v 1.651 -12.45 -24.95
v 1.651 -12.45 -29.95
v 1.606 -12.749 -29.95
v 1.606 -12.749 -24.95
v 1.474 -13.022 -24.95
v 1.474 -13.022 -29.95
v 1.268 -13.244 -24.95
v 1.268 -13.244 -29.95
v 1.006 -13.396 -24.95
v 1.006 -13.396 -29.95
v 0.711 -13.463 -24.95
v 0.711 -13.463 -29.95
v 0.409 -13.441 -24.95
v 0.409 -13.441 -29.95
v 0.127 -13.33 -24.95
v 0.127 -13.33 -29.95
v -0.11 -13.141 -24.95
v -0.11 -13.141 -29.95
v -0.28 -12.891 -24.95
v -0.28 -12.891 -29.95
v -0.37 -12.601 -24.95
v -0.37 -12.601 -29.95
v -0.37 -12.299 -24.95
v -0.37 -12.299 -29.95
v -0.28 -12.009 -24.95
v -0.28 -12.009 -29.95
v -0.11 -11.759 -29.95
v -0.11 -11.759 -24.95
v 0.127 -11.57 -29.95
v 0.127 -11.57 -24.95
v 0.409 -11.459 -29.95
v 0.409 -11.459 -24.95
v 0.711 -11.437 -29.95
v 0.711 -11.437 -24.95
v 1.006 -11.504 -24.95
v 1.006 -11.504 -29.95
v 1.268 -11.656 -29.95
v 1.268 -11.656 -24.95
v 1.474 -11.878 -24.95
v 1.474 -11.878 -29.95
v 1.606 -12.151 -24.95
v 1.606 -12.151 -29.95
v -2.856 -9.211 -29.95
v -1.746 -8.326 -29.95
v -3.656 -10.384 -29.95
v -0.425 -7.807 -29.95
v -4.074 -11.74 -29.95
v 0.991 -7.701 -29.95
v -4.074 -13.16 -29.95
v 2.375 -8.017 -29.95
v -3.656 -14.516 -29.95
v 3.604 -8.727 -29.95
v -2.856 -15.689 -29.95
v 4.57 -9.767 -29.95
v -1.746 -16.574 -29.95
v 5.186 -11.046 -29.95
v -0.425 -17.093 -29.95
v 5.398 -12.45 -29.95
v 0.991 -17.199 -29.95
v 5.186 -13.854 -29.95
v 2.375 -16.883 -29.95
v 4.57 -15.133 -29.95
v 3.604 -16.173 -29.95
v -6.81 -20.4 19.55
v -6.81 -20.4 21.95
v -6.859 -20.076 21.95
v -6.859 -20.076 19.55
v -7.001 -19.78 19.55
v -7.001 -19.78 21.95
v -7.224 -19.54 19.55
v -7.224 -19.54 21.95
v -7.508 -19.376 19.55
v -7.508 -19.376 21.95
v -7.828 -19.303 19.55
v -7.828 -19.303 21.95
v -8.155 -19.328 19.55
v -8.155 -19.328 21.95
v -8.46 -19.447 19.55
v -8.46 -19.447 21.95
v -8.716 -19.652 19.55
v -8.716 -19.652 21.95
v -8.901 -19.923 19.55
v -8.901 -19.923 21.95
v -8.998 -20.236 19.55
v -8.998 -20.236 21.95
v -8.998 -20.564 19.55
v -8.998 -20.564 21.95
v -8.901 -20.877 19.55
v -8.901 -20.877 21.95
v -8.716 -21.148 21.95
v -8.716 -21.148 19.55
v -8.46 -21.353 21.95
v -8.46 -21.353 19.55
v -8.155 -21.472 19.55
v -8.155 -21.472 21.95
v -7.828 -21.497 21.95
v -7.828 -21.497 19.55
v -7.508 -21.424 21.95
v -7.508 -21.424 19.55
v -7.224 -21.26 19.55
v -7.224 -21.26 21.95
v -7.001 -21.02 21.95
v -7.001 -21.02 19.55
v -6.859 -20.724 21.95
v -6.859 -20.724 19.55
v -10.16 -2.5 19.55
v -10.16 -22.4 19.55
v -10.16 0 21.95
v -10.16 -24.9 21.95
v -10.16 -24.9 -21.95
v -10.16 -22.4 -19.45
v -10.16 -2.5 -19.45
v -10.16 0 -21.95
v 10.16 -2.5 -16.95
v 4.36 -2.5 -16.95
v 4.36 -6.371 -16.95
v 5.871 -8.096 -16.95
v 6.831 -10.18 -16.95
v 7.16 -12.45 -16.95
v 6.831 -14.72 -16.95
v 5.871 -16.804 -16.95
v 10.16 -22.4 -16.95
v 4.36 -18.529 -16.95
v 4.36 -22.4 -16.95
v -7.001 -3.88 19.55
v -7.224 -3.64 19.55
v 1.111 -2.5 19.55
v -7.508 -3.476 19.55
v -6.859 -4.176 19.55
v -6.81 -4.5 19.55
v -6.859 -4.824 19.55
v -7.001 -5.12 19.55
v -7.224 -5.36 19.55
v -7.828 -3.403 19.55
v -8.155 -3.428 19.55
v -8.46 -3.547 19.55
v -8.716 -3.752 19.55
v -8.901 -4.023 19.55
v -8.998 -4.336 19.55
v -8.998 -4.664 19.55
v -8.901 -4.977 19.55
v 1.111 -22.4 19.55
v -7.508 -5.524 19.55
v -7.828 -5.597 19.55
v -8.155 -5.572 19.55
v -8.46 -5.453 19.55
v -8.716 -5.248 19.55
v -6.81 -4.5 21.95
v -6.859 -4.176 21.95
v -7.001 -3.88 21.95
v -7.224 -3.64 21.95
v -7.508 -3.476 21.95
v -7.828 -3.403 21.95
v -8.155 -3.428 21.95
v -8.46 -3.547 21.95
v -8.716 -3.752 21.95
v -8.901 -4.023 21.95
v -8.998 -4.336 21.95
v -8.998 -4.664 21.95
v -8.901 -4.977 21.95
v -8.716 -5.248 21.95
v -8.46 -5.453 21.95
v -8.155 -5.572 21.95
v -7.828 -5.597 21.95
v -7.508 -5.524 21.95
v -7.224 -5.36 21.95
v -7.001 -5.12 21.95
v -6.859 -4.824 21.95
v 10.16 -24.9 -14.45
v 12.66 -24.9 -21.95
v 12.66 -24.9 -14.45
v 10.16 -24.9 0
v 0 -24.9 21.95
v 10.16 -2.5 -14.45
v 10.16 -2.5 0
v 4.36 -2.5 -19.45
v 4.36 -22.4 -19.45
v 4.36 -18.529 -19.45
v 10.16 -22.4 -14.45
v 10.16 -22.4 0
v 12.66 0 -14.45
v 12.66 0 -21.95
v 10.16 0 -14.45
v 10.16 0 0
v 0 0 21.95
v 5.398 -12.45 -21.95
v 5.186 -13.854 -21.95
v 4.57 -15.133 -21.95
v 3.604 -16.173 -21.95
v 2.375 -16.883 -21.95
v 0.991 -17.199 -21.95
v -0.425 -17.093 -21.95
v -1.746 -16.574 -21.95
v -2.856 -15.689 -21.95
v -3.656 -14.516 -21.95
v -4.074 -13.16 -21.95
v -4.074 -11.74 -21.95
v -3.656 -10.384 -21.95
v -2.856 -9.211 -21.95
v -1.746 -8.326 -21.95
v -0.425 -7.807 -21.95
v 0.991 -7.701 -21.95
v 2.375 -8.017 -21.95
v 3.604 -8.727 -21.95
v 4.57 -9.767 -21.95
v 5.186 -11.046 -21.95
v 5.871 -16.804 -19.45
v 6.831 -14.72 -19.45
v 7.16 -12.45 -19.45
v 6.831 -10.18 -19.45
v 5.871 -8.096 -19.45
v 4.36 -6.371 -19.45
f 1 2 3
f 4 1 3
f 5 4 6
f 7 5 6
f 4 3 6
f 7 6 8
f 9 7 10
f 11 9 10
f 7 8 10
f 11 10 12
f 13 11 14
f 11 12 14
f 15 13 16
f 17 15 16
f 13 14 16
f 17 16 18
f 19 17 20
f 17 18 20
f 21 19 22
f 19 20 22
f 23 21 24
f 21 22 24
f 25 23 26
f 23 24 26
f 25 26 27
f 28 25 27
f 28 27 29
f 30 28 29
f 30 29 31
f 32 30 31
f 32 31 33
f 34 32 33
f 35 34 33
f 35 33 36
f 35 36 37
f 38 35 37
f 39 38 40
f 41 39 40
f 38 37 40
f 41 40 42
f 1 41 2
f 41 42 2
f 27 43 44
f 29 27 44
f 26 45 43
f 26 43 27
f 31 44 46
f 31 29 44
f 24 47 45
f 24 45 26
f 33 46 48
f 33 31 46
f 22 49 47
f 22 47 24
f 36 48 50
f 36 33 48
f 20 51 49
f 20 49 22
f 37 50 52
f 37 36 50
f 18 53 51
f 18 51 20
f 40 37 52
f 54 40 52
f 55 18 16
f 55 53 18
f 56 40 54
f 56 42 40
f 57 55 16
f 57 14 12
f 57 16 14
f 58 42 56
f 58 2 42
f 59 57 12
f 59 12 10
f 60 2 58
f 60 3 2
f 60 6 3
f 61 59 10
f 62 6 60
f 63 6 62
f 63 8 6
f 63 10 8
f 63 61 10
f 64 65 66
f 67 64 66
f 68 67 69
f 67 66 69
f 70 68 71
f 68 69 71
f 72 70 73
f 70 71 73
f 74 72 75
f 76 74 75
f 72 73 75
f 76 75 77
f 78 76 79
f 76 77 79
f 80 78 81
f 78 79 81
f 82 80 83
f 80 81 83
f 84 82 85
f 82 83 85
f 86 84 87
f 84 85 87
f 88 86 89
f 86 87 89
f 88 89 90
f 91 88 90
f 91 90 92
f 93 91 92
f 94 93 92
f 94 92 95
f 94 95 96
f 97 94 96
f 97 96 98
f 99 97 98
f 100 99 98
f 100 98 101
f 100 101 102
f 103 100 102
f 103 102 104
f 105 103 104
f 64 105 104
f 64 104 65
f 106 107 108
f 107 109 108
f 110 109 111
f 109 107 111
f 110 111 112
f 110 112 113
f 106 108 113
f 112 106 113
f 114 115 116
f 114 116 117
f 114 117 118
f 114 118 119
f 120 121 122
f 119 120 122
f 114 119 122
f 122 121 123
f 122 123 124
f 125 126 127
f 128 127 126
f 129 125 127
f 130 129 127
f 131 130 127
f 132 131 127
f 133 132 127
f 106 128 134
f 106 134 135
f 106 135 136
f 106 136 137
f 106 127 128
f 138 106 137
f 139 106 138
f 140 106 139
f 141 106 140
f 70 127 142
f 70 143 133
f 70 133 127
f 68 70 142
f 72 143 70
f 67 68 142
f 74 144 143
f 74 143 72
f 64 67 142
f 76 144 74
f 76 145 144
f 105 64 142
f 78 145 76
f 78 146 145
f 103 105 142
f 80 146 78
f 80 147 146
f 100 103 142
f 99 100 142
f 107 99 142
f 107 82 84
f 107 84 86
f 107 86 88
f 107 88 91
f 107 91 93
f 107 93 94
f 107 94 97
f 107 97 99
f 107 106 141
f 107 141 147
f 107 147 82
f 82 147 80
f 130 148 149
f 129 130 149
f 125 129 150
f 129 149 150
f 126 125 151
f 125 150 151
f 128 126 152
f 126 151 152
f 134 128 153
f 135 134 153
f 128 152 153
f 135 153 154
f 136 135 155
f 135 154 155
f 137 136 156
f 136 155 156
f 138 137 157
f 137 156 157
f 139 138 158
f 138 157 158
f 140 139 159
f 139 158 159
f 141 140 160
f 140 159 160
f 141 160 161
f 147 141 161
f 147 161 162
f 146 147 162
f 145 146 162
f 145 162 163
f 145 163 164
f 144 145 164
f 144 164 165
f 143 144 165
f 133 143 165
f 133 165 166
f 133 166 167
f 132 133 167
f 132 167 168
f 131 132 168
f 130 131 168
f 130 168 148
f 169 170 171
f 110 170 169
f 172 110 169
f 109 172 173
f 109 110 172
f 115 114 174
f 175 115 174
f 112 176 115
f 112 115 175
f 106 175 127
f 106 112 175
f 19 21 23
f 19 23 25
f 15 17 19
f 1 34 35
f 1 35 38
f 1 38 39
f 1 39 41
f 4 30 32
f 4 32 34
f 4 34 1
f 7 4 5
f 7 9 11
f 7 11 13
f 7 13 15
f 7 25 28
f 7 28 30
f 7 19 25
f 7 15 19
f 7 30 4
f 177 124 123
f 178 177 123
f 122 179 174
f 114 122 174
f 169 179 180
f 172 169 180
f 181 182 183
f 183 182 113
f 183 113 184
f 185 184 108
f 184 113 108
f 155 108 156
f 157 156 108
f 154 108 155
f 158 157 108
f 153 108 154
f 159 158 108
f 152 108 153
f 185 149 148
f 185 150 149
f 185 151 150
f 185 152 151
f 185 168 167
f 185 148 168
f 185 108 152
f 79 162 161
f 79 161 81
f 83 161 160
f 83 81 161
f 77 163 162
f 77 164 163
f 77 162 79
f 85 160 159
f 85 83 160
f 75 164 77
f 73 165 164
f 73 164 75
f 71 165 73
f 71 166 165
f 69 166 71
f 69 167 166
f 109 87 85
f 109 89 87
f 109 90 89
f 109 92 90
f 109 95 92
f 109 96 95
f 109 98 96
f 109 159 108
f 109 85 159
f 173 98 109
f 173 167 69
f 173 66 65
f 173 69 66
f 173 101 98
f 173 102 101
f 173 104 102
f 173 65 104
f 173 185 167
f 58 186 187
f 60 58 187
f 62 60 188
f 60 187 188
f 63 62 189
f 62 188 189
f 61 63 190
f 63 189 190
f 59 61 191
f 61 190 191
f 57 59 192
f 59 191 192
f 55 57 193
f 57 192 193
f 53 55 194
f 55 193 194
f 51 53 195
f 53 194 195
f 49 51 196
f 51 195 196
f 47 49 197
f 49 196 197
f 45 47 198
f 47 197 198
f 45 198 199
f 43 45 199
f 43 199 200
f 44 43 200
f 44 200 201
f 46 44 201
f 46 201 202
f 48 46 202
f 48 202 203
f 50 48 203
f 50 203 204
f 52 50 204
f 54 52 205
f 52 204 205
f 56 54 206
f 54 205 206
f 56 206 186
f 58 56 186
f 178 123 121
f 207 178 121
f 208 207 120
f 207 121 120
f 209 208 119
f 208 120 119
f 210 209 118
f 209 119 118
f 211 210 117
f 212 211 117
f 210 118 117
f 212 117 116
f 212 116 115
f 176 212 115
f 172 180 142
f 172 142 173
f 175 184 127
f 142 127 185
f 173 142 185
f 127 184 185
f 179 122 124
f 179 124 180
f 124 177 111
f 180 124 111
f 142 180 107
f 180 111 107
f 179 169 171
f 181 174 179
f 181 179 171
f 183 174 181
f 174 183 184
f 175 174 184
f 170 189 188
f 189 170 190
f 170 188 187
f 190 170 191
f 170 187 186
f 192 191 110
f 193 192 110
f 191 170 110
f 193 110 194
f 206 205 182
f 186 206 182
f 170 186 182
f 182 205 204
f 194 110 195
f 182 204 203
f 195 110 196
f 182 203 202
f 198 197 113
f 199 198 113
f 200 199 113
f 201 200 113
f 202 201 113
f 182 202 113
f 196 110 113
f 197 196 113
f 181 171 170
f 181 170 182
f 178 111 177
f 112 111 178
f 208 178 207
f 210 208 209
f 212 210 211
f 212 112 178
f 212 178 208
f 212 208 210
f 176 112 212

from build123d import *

# Parameters (mm, degrees)
F1_DEPTH  = 24.9
F2_W      = 19.9
F2_H      = 36.5
F3_DEPTH  = 25.4
F4_W      = 24.9
F4_H      = 5
F4_H_2    = 7.5
F5_DEPTH  = 2.5
F7_DEPTH  = 2.5
F8_R      = 1.1
F9_DEPTH  = 25.4
F10_R     = 4.7625
F11_DEPTH = 8
F12_R     = 1.016
F13_DEPTH = 5
F14_W     = 2.5
F14_H     = 7.5
F14_H_2   = 5
F15_DEPTH = 25.4
F16_W     = 24.9
F16_H     = 7.5
F17_DEPTH = 2.5


with BuildPart() as f1:
    # F0 (on Front) → F1 (new body)
    with BuildSketch(Plane.XZ):
        Polygon((10.16, 0), (0, 21.95), (-10.16, 21.95), (-10.16, -21.95), (10.16, -21.95), align=None)
    extrude(amount=F1_DEPTH)

    # F2 (on face) → F3 (cut)
    with BuildSketch(Plane(origin=(-10.16, 0, 0), x_dir=(0, -1, 0), z_dir=(-1, 0, 0))):
        with Locations((12.45, 1.3)):
            Rectangle(F2_W, F2_H)
    extrude(amount=-F3_DEPTH, mode=Mode.SUBTRACT)

    # F4 (on face) → F5 (join)
    with BuildSketch(Plane(origin=(-10.16, 0, 0), x_dir=(0, -1, 0), z_dir=(-1, 0, 0))):
        with Locations((12.45, 19.45)):
            Rectangle(F4_W, F4_H)
        with Locations((12.45, -18.2)):
            Rectangle(F4_W, F4_H_2)
    extrude(amount=F5_DEPTH)

    # F6 (on face) → F7 (cut)
    with BuildSketch(Plane.XY.offset(-16.95)):
        with BuildLine():
            Line((4.36, -6.370526), (4.36, -2.5))
            Line((4.36, -2.5), (-10.16, -2.5))
            Line((-10.16, -2.5), (-10.16, -22.4))
            Line((-10.16, -22.4), (4.36, -22.4))
            Line((4.36, -22.4), (4.36, -18.529474))
            ThreePointArc((4.36, -18.529474), (7.16, -12.45), (4.36, -6.370526))
        make_face()
    extrude(amount=-F7_DEPTH, mode=Mode.SUBTRACT)

    # F8 (on face) → F9 (cut)
    with BuildSketch(Plane.XY.offset(21.95)):
        with Locations((-7.91, -4.5)):
            Circle(F8_R)
        with Locations((-7.91, -20.4)):
            Circle(F8_R)
    extrude(amount=-F9_DEPTH, mode=Mode.SUBTRACT)

    # F10 (on face) → F11 (join)
    with BuildSketch(Plane(origin=(0, 0, -21.95), x_dir=(1, 0, 0), z_dir=(0, 0, -1))):
        with Locations((0.635, 12.45)):
            Circle(F10_R)
    extrude(amount=F11_DEPTH)

    # F12 (on face) → F13 (cut)
    with BuildSketch(Plane(origin=(0, 0, -29.95), x_dir=(1, 0, 0), z_dir=(0, 0, -1))):
        with Locations((0.635, 12.45)):
            Circle(F12_R)
    extrude(amount=-F13_DEPTH, mode=Mode.SUBTRACT)

    # F14 (on face) → F15 (cut)
    with BuildSketch(Plane.XZ.offset(24.9)):
        with Locations((-11.41, -18.2)):
            Rectangle(F14_W, F14_H)
        with Locations((-11.41, 19.45)):
            Rectangle(F14_W, F14_H_2)
    extrude(amount=-F15_DEPTH, mode=Mode.SUBTRACT)

    # F16 (on face) → F17 (join)
    with BuildSketch(Plane.YZ.offset(10.16)):
        with Locations((-12.45, -18.2)):
            Rectangle(F16_W, F16_H)
    extrude(amount=F17_DEPTH)


solid = f1.part
